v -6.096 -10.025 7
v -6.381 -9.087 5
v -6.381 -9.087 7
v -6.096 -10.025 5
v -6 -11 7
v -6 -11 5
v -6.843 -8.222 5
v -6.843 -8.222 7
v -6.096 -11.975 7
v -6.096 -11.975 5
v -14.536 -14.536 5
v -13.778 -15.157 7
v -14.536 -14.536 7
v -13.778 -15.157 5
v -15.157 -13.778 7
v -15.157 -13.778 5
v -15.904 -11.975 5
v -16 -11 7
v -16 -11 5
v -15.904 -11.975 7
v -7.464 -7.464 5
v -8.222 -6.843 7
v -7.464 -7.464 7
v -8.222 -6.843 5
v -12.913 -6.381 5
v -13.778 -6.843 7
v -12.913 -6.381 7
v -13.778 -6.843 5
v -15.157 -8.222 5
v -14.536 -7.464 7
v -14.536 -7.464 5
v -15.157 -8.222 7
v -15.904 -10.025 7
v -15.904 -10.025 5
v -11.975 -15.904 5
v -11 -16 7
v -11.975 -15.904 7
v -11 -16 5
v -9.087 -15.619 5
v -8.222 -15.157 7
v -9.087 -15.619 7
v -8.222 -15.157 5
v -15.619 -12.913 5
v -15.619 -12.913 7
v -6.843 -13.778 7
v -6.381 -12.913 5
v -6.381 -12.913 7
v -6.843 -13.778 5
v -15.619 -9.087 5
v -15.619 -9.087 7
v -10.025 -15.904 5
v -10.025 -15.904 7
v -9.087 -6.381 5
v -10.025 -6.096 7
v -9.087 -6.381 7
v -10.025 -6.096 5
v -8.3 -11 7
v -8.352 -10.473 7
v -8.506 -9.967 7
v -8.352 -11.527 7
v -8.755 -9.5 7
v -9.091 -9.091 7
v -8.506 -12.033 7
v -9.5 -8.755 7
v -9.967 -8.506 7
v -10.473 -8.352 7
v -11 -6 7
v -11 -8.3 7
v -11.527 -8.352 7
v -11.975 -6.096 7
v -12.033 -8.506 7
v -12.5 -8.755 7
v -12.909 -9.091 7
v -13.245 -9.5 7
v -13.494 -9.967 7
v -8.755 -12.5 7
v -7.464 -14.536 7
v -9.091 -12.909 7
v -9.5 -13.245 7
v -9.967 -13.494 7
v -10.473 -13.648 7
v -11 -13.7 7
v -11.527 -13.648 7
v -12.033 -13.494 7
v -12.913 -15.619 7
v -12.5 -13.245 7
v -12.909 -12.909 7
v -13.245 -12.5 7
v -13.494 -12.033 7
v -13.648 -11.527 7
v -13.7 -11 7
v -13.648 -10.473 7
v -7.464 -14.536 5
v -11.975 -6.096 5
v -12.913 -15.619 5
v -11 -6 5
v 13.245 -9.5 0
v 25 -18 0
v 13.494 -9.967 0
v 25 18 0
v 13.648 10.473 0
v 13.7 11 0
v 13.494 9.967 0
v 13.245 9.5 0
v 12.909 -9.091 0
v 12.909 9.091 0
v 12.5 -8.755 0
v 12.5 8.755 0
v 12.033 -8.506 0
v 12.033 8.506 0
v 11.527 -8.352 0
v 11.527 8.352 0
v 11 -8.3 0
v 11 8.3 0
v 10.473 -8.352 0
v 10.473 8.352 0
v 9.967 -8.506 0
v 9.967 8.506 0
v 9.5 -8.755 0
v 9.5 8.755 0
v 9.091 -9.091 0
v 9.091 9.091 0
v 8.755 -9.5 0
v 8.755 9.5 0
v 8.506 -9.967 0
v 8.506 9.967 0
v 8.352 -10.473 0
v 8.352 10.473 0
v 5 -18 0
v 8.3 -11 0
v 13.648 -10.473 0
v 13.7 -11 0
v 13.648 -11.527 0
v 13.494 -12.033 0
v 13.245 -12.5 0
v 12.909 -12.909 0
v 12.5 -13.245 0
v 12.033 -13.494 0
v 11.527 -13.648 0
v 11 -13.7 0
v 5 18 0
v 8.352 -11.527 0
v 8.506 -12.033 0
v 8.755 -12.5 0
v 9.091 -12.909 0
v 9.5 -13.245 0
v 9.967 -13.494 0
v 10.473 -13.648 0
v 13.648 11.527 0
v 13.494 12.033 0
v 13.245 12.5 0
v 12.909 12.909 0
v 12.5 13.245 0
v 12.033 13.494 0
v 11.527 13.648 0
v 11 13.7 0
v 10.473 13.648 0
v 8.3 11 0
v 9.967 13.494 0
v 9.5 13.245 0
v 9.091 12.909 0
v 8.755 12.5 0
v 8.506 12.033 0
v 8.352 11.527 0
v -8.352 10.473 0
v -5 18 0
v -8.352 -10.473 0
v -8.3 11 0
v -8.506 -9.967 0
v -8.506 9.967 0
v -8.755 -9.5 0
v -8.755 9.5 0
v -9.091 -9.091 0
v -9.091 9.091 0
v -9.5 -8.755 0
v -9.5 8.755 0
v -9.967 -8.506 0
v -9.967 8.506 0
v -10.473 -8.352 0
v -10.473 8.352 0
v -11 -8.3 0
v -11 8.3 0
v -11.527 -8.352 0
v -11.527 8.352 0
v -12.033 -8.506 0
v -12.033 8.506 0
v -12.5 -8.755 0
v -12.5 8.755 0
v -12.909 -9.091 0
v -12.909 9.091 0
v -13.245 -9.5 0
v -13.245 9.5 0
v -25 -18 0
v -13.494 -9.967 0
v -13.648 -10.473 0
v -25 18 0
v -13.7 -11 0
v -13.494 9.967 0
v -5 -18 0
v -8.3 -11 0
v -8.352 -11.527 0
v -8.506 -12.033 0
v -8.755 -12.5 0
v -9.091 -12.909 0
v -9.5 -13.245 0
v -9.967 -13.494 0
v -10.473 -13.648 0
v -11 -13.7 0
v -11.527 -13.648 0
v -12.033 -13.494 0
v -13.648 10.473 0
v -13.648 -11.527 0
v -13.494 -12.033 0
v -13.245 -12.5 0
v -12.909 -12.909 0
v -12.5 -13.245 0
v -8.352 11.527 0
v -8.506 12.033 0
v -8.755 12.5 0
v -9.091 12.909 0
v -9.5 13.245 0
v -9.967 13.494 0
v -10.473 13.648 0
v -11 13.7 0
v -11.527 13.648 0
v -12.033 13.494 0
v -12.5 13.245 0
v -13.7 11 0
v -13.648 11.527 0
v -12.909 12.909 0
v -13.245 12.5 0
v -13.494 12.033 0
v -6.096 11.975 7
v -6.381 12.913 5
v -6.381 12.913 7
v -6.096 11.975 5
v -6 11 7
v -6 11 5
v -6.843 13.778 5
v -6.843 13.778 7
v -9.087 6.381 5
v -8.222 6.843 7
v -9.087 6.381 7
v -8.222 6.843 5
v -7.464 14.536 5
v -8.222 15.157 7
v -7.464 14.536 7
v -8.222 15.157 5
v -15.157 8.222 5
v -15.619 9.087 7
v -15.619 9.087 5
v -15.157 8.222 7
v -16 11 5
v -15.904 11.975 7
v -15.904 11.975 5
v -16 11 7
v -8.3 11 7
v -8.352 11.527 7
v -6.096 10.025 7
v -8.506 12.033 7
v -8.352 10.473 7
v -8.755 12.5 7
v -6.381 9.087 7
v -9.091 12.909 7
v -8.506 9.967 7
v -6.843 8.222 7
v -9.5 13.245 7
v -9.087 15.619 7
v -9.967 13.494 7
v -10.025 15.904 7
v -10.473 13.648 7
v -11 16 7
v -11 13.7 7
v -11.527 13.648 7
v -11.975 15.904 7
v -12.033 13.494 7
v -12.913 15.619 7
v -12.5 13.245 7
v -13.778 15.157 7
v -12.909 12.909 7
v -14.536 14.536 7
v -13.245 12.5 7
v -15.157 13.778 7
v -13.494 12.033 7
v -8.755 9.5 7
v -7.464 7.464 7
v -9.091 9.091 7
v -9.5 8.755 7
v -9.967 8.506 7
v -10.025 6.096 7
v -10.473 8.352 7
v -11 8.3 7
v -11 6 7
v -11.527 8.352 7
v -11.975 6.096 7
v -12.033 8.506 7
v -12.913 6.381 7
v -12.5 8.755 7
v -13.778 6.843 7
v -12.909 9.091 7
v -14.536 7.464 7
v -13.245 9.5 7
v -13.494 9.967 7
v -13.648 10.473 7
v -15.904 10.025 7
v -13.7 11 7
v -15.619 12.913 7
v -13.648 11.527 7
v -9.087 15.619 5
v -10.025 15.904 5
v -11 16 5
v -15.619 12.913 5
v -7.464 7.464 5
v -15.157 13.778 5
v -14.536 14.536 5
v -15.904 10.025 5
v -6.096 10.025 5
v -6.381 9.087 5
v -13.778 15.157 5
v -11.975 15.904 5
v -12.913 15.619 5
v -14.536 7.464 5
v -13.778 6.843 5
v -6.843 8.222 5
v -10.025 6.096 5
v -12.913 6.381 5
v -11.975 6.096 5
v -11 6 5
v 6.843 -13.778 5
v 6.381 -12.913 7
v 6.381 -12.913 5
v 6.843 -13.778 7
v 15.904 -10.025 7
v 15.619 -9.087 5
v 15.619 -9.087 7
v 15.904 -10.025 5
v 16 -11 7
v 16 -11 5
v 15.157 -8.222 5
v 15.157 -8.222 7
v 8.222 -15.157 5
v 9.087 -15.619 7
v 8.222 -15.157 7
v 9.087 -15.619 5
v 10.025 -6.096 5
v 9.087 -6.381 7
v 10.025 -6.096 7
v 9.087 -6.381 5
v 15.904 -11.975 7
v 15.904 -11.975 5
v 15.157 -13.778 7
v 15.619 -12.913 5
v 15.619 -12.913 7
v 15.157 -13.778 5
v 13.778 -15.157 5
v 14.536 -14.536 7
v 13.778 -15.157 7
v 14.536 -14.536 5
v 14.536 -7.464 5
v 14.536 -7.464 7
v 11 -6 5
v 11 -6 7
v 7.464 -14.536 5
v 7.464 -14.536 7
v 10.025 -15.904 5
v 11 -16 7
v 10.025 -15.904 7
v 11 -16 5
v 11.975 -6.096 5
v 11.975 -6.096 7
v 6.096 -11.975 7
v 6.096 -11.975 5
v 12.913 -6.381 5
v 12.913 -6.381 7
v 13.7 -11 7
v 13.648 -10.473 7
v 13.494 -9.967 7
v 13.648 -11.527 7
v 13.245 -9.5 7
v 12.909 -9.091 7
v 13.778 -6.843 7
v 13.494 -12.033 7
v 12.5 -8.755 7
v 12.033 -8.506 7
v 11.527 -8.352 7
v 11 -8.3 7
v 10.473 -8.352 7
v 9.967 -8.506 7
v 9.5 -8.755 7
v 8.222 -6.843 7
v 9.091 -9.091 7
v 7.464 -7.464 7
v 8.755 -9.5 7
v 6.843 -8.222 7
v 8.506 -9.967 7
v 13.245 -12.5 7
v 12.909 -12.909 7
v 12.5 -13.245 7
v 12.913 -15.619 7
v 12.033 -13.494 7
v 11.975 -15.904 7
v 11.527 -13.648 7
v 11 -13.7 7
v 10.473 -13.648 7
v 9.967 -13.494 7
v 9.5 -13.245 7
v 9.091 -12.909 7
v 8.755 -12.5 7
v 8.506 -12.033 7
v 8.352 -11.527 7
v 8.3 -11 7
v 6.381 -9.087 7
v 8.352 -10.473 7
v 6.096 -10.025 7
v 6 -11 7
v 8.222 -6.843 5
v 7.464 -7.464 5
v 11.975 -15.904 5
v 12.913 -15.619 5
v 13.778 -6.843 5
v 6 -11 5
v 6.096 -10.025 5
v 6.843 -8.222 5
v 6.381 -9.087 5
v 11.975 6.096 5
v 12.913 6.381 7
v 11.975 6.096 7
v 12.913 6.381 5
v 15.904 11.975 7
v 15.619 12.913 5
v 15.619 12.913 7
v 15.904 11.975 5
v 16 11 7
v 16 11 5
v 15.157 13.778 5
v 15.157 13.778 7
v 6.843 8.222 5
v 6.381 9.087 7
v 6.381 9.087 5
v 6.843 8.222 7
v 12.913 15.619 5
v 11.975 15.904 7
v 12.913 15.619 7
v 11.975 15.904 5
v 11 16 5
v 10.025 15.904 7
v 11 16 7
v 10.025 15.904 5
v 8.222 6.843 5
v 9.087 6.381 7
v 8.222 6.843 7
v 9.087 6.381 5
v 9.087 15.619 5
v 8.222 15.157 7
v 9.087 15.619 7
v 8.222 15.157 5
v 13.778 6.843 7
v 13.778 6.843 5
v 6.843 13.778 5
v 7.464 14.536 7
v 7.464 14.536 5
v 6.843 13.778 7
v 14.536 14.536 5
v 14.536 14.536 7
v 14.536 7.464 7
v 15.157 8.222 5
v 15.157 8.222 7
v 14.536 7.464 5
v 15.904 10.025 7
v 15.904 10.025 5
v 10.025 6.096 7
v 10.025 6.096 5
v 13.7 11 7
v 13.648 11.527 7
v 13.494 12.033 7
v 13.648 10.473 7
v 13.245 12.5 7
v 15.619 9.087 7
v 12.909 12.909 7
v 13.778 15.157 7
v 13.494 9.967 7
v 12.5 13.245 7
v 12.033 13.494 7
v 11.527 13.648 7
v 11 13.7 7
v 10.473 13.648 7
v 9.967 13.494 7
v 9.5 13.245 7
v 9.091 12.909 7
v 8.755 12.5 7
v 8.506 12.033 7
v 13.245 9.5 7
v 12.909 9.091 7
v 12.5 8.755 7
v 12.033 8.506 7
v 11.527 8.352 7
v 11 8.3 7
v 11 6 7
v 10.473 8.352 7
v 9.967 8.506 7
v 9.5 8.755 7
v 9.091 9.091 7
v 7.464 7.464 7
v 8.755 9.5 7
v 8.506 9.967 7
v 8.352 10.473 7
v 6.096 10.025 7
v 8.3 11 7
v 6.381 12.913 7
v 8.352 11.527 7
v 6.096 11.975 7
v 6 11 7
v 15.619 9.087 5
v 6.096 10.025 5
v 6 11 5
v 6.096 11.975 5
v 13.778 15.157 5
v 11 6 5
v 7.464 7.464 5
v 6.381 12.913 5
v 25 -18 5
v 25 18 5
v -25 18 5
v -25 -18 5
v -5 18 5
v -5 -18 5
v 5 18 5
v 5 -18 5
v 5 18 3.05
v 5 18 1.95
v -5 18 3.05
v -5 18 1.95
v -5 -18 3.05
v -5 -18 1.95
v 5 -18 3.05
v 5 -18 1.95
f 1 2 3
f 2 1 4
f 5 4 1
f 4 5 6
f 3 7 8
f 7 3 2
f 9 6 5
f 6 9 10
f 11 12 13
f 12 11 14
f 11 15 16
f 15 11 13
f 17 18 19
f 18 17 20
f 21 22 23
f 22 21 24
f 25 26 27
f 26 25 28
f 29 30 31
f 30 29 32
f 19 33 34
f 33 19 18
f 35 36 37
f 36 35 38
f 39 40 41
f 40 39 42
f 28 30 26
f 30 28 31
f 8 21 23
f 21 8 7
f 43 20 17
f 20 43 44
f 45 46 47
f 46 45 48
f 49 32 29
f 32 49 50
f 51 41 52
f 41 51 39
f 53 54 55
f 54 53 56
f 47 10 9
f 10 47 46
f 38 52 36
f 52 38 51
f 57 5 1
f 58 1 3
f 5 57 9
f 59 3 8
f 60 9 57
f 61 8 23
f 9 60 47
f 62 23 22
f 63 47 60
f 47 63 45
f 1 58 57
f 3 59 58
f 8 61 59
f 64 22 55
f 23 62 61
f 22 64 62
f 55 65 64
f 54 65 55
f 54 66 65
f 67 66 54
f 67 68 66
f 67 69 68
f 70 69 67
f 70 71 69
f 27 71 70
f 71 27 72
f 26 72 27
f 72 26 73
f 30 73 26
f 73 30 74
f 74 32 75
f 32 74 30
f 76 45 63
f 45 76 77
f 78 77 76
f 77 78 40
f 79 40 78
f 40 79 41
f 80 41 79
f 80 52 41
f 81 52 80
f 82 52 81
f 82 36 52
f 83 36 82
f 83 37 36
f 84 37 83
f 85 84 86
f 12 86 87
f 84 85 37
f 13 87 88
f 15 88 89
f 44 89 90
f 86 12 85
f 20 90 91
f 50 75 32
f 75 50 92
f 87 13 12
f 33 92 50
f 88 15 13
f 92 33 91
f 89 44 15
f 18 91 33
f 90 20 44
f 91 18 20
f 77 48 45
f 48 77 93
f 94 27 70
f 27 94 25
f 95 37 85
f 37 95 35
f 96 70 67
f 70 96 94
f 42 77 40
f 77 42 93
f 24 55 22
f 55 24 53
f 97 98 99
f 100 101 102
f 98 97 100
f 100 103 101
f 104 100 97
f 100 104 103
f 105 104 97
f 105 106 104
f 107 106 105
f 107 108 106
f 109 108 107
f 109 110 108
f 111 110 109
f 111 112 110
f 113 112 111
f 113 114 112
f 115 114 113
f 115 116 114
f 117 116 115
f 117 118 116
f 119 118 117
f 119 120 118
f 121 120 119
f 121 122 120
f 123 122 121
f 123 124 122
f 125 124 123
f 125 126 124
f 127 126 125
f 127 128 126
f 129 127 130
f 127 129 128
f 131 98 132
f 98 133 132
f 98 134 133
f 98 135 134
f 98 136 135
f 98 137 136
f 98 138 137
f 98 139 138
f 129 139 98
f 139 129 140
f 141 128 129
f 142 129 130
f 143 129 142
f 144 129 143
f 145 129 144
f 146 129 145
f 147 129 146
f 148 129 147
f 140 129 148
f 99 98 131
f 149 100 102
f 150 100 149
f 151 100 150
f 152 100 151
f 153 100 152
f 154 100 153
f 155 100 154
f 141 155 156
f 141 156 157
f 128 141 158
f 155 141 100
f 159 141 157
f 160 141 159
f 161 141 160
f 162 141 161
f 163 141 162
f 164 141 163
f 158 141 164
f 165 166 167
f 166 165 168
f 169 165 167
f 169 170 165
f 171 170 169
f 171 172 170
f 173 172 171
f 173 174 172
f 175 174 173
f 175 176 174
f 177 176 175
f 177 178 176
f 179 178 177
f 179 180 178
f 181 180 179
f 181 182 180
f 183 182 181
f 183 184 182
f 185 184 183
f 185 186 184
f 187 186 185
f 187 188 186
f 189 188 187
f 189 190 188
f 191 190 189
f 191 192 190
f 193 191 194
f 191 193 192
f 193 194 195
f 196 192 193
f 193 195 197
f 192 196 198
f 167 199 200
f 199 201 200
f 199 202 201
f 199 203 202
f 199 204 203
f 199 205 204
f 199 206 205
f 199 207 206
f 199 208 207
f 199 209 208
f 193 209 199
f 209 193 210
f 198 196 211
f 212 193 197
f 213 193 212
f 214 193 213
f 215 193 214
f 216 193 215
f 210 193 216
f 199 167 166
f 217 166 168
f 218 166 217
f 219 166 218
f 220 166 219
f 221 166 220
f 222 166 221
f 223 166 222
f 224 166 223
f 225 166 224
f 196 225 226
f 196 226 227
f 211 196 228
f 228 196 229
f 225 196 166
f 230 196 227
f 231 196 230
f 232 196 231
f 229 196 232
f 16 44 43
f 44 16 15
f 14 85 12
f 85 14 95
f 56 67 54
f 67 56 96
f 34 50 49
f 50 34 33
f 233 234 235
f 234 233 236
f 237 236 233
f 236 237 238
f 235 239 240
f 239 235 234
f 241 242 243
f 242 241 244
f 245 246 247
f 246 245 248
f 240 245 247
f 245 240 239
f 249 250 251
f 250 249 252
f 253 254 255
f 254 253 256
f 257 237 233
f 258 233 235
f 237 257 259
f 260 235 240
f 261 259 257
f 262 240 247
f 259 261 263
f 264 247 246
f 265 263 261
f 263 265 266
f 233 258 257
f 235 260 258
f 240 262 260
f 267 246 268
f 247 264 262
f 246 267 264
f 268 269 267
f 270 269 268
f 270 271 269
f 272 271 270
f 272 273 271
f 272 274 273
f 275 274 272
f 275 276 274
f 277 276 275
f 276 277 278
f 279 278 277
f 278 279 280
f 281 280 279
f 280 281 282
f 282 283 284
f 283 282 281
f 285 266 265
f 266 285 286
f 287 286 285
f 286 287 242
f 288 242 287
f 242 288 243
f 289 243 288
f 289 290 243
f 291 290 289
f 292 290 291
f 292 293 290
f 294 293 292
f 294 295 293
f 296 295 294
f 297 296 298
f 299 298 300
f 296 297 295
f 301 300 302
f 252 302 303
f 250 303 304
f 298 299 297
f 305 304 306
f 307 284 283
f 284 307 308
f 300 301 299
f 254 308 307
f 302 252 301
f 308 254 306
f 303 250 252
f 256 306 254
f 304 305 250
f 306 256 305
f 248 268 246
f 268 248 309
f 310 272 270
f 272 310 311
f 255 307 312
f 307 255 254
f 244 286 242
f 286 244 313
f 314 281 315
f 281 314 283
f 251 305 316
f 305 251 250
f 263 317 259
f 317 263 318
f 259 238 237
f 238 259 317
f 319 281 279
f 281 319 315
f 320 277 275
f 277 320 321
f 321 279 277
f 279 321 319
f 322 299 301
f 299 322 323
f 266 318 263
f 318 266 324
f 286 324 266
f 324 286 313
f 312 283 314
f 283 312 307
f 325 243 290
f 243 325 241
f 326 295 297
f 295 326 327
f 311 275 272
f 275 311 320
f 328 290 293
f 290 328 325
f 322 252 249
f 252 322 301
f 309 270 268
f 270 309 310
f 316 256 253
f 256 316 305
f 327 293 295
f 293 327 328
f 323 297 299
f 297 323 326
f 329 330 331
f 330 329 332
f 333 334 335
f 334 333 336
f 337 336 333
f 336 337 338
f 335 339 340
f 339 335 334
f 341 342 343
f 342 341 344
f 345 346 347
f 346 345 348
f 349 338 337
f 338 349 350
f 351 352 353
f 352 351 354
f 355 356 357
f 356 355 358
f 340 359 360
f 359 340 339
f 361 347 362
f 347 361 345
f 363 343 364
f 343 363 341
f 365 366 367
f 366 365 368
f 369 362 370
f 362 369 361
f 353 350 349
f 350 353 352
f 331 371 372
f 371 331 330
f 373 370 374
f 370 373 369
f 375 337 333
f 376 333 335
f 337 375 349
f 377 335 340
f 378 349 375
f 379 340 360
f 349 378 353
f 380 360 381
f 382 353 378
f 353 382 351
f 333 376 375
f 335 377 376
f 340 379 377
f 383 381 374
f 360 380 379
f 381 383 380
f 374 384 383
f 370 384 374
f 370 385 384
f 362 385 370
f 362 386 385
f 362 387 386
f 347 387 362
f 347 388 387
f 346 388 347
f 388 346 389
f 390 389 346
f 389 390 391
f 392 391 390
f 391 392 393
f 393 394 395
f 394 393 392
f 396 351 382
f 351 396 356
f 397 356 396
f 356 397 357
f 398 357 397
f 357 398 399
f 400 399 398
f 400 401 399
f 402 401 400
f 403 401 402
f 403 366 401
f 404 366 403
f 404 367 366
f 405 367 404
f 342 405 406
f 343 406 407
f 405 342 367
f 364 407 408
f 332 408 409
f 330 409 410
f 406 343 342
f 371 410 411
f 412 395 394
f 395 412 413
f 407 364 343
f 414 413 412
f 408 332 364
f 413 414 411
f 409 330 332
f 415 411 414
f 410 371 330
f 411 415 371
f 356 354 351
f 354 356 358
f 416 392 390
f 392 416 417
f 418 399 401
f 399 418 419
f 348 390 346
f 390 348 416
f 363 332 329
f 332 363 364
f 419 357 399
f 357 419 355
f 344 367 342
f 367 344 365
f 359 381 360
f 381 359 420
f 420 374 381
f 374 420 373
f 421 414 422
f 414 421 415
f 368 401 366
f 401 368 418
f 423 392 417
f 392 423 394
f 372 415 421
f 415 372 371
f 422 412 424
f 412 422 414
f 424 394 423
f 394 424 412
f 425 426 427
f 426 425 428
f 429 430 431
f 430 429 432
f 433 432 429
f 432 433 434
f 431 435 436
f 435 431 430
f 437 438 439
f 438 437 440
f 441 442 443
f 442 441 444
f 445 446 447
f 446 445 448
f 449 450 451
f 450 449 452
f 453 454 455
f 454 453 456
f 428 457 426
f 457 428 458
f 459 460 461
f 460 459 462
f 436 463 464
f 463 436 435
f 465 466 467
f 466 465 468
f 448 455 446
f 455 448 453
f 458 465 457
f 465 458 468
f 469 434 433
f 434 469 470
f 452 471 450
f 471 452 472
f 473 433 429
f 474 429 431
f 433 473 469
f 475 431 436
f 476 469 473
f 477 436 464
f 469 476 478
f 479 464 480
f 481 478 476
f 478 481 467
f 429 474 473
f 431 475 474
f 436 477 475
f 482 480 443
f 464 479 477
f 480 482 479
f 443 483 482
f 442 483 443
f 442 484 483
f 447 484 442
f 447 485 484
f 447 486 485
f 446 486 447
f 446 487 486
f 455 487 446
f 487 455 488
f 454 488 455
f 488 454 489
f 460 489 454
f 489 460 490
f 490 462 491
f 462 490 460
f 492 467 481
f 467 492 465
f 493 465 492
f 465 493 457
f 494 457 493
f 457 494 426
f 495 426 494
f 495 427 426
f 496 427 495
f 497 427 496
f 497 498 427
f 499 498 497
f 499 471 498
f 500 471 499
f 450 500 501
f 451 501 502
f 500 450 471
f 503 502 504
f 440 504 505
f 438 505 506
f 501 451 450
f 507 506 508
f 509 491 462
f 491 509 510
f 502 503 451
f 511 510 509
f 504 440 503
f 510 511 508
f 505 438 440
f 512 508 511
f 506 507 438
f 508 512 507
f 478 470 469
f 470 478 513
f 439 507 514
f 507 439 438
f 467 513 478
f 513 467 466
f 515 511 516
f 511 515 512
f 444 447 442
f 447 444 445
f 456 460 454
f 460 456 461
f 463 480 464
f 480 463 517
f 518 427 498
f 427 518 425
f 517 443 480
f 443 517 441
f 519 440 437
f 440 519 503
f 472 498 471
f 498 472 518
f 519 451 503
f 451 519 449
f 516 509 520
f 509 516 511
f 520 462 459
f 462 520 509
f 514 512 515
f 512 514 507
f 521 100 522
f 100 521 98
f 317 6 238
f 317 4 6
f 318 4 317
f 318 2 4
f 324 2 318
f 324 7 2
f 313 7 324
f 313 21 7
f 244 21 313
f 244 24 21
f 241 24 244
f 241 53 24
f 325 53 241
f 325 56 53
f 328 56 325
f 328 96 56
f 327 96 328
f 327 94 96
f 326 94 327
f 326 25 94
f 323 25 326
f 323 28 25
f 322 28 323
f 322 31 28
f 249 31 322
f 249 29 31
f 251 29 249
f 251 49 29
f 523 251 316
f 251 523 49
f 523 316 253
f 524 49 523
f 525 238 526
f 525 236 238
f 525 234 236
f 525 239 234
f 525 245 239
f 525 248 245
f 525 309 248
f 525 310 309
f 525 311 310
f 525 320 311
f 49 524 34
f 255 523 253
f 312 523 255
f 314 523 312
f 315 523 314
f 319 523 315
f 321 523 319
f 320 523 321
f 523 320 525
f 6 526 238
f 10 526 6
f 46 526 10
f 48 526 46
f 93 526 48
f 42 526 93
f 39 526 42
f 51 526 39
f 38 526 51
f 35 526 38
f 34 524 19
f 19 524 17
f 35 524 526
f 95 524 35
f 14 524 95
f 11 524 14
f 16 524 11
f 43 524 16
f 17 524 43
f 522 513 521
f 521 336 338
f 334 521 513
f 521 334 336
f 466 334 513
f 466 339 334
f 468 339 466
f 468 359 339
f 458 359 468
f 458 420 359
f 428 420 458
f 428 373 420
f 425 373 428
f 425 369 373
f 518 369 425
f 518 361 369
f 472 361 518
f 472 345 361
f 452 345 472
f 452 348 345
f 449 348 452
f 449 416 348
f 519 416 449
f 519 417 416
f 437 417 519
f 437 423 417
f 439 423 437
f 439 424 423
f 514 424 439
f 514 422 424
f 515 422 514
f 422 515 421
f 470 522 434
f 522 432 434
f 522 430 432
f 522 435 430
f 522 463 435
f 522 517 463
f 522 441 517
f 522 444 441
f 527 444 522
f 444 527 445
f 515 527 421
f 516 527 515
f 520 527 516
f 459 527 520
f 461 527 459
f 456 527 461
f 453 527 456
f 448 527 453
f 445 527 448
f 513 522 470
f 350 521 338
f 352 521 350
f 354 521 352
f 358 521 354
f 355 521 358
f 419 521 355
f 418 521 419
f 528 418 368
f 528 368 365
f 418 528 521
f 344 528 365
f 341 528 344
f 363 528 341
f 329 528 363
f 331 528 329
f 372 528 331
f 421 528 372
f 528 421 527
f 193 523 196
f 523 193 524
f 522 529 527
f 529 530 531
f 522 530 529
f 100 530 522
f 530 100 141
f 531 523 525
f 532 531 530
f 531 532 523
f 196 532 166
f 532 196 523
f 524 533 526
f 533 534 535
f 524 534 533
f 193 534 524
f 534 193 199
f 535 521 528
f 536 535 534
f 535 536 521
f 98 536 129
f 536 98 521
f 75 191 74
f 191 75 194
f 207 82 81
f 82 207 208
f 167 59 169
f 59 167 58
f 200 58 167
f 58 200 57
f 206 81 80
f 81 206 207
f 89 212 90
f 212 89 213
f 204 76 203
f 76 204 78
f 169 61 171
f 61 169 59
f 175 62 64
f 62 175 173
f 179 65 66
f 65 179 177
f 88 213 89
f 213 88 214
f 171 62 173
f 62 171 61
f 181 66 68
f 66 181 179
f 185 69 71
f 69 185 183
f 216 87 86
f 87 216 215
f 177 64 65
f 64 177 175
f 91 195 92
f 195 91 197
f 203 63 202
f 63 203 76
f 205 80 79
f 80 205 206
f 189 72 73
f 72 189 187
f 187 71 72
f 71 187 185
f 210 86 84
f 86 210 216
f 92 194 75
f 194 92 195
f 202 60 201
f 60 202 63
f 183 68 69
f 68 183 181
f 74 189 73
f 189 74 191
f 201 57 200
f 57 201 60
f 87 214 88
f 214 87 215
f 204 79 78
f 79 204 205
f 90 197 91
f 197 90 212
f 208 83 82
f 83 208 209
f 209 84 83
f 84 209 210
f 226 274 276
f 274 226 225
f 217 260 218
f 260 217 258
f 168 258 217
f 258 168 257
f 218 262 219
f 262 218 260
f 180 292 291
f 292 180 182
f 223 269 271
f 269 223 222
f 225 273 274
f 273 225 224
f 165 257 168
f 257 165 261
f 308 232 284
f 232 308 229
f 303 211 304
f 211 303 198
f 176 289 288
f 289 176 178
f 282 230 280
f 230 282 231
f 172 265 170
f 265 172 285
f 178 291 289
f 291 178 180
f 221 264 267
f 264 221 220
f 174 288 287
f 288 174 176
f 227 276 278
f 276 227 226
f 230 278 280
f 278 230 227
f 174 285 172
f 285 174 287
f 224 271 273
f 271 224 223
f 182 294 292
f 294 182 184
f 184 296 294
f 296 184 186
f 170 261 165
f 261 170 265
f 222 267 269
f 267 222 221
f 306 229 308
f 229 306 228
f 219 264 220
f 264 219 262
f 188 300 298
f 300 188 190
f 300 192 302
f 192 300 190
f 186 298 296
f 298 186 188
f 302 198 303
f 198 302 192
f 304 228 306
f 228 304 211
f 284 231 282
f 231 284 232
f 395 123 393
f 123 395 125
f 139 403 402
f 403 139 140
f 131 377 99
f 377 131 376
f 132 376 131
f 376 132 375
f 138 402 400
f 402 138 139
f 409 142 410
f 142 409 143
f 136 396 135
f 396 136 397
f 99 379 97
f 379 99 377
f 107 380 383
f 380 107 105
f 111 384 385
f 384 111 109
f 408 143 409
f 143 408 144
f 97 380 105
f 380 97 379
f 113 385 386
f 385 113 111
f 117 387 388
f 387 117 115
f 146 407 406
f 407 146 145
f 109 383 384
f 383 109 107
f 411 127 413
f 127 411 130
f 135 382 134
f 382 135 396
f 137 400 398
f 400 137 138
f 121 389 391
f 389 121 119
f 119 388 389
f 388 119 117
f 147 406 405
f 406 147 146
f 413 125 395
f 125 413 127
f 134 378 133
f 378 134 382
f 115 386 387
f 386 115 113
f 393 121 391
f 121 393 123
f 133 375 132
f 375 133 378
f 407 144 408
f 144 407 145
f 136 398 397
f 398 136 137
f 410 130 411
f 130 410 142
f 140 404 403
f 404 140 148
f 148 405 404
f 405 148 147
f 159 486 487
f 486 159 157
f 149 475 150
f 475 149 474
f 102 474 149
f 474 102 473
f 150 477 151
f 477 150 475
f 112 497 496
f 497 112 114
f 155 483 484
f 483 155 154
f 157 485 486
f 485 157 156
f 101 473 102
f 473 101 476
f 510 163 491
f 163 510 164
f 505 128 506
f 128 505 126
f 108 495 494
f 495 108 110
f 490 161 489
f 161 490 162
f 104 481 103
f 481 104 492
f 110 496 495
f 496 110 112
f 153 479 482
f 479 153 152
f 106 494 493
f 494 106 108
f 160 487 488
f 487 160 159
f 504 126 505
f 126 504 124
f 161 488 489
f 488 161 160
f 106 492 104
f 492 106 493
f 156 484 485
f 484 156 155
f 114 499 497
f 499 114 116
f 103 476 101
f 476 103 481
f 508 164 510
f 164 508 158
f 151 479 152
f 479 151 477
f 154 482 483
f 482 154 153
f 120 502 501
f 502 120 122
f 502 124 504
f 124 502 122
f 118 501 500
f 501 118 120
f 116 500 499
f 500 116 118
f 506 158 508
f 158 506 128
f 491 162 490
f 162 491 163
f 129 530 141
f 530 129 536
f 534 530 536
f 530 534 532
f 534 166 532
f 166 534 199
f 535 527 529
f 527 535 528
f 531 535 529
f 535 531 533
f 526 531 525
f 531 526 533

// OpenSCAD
$fn = 32;

// ----------------------------------------------------------------------
// Living hinge: 50 x 36 mm plates, 1.1 mm flexible web
// ----------------------------------------------------------------------

// --- parameters (mm) ---
plate_len = 20;           // plate length outside the web
plate_w = 36;             // plate width
thick = 5;                // plate thickness
web_half = 5;             // half width of the flex band
web_t = 1.1;              // flexible web thickness
web_z = 1.95;             // web position inside the thickness
boss_d = 10;              // screw boss diameter
boss_h = 7;               // screw boss height
boss_x = 11;              // screw boss distance from the web
screw_d = 5.4;            // screw hole

difference() {
  union() {
    /* one flat strip, later thinned at the middle */
    translate([-25, -18, 0]) cube([50, 36, 5]);
    /* screw bosses, sunk 0.5 mm into the plates */
    for (sx = [-11, 11]) {
      for (sy = [-11, 11]) {
        translate([sx, sy, 0]) cylinder(h = boss_h, d = boss_d);
      }
    }
  }
  /* channel from below: leaves the web on top of it */
  translate([-5, -20.5, -2.5]) cube([10, 41, 4.45]);
  /* channel from above: thins the web down to web_t */
  translate([-5, -20.5, 3.05]) cube([10, 41, 4.45]);
  /* screw holes through the bosses */
  for (sx = [-11, 11]) {
    for (sy = [-11, 11]) {
      translate([sx, sy, -2.5]) cylinder(h = boss_h + 5, d = screw_d);
    }
  }
}
